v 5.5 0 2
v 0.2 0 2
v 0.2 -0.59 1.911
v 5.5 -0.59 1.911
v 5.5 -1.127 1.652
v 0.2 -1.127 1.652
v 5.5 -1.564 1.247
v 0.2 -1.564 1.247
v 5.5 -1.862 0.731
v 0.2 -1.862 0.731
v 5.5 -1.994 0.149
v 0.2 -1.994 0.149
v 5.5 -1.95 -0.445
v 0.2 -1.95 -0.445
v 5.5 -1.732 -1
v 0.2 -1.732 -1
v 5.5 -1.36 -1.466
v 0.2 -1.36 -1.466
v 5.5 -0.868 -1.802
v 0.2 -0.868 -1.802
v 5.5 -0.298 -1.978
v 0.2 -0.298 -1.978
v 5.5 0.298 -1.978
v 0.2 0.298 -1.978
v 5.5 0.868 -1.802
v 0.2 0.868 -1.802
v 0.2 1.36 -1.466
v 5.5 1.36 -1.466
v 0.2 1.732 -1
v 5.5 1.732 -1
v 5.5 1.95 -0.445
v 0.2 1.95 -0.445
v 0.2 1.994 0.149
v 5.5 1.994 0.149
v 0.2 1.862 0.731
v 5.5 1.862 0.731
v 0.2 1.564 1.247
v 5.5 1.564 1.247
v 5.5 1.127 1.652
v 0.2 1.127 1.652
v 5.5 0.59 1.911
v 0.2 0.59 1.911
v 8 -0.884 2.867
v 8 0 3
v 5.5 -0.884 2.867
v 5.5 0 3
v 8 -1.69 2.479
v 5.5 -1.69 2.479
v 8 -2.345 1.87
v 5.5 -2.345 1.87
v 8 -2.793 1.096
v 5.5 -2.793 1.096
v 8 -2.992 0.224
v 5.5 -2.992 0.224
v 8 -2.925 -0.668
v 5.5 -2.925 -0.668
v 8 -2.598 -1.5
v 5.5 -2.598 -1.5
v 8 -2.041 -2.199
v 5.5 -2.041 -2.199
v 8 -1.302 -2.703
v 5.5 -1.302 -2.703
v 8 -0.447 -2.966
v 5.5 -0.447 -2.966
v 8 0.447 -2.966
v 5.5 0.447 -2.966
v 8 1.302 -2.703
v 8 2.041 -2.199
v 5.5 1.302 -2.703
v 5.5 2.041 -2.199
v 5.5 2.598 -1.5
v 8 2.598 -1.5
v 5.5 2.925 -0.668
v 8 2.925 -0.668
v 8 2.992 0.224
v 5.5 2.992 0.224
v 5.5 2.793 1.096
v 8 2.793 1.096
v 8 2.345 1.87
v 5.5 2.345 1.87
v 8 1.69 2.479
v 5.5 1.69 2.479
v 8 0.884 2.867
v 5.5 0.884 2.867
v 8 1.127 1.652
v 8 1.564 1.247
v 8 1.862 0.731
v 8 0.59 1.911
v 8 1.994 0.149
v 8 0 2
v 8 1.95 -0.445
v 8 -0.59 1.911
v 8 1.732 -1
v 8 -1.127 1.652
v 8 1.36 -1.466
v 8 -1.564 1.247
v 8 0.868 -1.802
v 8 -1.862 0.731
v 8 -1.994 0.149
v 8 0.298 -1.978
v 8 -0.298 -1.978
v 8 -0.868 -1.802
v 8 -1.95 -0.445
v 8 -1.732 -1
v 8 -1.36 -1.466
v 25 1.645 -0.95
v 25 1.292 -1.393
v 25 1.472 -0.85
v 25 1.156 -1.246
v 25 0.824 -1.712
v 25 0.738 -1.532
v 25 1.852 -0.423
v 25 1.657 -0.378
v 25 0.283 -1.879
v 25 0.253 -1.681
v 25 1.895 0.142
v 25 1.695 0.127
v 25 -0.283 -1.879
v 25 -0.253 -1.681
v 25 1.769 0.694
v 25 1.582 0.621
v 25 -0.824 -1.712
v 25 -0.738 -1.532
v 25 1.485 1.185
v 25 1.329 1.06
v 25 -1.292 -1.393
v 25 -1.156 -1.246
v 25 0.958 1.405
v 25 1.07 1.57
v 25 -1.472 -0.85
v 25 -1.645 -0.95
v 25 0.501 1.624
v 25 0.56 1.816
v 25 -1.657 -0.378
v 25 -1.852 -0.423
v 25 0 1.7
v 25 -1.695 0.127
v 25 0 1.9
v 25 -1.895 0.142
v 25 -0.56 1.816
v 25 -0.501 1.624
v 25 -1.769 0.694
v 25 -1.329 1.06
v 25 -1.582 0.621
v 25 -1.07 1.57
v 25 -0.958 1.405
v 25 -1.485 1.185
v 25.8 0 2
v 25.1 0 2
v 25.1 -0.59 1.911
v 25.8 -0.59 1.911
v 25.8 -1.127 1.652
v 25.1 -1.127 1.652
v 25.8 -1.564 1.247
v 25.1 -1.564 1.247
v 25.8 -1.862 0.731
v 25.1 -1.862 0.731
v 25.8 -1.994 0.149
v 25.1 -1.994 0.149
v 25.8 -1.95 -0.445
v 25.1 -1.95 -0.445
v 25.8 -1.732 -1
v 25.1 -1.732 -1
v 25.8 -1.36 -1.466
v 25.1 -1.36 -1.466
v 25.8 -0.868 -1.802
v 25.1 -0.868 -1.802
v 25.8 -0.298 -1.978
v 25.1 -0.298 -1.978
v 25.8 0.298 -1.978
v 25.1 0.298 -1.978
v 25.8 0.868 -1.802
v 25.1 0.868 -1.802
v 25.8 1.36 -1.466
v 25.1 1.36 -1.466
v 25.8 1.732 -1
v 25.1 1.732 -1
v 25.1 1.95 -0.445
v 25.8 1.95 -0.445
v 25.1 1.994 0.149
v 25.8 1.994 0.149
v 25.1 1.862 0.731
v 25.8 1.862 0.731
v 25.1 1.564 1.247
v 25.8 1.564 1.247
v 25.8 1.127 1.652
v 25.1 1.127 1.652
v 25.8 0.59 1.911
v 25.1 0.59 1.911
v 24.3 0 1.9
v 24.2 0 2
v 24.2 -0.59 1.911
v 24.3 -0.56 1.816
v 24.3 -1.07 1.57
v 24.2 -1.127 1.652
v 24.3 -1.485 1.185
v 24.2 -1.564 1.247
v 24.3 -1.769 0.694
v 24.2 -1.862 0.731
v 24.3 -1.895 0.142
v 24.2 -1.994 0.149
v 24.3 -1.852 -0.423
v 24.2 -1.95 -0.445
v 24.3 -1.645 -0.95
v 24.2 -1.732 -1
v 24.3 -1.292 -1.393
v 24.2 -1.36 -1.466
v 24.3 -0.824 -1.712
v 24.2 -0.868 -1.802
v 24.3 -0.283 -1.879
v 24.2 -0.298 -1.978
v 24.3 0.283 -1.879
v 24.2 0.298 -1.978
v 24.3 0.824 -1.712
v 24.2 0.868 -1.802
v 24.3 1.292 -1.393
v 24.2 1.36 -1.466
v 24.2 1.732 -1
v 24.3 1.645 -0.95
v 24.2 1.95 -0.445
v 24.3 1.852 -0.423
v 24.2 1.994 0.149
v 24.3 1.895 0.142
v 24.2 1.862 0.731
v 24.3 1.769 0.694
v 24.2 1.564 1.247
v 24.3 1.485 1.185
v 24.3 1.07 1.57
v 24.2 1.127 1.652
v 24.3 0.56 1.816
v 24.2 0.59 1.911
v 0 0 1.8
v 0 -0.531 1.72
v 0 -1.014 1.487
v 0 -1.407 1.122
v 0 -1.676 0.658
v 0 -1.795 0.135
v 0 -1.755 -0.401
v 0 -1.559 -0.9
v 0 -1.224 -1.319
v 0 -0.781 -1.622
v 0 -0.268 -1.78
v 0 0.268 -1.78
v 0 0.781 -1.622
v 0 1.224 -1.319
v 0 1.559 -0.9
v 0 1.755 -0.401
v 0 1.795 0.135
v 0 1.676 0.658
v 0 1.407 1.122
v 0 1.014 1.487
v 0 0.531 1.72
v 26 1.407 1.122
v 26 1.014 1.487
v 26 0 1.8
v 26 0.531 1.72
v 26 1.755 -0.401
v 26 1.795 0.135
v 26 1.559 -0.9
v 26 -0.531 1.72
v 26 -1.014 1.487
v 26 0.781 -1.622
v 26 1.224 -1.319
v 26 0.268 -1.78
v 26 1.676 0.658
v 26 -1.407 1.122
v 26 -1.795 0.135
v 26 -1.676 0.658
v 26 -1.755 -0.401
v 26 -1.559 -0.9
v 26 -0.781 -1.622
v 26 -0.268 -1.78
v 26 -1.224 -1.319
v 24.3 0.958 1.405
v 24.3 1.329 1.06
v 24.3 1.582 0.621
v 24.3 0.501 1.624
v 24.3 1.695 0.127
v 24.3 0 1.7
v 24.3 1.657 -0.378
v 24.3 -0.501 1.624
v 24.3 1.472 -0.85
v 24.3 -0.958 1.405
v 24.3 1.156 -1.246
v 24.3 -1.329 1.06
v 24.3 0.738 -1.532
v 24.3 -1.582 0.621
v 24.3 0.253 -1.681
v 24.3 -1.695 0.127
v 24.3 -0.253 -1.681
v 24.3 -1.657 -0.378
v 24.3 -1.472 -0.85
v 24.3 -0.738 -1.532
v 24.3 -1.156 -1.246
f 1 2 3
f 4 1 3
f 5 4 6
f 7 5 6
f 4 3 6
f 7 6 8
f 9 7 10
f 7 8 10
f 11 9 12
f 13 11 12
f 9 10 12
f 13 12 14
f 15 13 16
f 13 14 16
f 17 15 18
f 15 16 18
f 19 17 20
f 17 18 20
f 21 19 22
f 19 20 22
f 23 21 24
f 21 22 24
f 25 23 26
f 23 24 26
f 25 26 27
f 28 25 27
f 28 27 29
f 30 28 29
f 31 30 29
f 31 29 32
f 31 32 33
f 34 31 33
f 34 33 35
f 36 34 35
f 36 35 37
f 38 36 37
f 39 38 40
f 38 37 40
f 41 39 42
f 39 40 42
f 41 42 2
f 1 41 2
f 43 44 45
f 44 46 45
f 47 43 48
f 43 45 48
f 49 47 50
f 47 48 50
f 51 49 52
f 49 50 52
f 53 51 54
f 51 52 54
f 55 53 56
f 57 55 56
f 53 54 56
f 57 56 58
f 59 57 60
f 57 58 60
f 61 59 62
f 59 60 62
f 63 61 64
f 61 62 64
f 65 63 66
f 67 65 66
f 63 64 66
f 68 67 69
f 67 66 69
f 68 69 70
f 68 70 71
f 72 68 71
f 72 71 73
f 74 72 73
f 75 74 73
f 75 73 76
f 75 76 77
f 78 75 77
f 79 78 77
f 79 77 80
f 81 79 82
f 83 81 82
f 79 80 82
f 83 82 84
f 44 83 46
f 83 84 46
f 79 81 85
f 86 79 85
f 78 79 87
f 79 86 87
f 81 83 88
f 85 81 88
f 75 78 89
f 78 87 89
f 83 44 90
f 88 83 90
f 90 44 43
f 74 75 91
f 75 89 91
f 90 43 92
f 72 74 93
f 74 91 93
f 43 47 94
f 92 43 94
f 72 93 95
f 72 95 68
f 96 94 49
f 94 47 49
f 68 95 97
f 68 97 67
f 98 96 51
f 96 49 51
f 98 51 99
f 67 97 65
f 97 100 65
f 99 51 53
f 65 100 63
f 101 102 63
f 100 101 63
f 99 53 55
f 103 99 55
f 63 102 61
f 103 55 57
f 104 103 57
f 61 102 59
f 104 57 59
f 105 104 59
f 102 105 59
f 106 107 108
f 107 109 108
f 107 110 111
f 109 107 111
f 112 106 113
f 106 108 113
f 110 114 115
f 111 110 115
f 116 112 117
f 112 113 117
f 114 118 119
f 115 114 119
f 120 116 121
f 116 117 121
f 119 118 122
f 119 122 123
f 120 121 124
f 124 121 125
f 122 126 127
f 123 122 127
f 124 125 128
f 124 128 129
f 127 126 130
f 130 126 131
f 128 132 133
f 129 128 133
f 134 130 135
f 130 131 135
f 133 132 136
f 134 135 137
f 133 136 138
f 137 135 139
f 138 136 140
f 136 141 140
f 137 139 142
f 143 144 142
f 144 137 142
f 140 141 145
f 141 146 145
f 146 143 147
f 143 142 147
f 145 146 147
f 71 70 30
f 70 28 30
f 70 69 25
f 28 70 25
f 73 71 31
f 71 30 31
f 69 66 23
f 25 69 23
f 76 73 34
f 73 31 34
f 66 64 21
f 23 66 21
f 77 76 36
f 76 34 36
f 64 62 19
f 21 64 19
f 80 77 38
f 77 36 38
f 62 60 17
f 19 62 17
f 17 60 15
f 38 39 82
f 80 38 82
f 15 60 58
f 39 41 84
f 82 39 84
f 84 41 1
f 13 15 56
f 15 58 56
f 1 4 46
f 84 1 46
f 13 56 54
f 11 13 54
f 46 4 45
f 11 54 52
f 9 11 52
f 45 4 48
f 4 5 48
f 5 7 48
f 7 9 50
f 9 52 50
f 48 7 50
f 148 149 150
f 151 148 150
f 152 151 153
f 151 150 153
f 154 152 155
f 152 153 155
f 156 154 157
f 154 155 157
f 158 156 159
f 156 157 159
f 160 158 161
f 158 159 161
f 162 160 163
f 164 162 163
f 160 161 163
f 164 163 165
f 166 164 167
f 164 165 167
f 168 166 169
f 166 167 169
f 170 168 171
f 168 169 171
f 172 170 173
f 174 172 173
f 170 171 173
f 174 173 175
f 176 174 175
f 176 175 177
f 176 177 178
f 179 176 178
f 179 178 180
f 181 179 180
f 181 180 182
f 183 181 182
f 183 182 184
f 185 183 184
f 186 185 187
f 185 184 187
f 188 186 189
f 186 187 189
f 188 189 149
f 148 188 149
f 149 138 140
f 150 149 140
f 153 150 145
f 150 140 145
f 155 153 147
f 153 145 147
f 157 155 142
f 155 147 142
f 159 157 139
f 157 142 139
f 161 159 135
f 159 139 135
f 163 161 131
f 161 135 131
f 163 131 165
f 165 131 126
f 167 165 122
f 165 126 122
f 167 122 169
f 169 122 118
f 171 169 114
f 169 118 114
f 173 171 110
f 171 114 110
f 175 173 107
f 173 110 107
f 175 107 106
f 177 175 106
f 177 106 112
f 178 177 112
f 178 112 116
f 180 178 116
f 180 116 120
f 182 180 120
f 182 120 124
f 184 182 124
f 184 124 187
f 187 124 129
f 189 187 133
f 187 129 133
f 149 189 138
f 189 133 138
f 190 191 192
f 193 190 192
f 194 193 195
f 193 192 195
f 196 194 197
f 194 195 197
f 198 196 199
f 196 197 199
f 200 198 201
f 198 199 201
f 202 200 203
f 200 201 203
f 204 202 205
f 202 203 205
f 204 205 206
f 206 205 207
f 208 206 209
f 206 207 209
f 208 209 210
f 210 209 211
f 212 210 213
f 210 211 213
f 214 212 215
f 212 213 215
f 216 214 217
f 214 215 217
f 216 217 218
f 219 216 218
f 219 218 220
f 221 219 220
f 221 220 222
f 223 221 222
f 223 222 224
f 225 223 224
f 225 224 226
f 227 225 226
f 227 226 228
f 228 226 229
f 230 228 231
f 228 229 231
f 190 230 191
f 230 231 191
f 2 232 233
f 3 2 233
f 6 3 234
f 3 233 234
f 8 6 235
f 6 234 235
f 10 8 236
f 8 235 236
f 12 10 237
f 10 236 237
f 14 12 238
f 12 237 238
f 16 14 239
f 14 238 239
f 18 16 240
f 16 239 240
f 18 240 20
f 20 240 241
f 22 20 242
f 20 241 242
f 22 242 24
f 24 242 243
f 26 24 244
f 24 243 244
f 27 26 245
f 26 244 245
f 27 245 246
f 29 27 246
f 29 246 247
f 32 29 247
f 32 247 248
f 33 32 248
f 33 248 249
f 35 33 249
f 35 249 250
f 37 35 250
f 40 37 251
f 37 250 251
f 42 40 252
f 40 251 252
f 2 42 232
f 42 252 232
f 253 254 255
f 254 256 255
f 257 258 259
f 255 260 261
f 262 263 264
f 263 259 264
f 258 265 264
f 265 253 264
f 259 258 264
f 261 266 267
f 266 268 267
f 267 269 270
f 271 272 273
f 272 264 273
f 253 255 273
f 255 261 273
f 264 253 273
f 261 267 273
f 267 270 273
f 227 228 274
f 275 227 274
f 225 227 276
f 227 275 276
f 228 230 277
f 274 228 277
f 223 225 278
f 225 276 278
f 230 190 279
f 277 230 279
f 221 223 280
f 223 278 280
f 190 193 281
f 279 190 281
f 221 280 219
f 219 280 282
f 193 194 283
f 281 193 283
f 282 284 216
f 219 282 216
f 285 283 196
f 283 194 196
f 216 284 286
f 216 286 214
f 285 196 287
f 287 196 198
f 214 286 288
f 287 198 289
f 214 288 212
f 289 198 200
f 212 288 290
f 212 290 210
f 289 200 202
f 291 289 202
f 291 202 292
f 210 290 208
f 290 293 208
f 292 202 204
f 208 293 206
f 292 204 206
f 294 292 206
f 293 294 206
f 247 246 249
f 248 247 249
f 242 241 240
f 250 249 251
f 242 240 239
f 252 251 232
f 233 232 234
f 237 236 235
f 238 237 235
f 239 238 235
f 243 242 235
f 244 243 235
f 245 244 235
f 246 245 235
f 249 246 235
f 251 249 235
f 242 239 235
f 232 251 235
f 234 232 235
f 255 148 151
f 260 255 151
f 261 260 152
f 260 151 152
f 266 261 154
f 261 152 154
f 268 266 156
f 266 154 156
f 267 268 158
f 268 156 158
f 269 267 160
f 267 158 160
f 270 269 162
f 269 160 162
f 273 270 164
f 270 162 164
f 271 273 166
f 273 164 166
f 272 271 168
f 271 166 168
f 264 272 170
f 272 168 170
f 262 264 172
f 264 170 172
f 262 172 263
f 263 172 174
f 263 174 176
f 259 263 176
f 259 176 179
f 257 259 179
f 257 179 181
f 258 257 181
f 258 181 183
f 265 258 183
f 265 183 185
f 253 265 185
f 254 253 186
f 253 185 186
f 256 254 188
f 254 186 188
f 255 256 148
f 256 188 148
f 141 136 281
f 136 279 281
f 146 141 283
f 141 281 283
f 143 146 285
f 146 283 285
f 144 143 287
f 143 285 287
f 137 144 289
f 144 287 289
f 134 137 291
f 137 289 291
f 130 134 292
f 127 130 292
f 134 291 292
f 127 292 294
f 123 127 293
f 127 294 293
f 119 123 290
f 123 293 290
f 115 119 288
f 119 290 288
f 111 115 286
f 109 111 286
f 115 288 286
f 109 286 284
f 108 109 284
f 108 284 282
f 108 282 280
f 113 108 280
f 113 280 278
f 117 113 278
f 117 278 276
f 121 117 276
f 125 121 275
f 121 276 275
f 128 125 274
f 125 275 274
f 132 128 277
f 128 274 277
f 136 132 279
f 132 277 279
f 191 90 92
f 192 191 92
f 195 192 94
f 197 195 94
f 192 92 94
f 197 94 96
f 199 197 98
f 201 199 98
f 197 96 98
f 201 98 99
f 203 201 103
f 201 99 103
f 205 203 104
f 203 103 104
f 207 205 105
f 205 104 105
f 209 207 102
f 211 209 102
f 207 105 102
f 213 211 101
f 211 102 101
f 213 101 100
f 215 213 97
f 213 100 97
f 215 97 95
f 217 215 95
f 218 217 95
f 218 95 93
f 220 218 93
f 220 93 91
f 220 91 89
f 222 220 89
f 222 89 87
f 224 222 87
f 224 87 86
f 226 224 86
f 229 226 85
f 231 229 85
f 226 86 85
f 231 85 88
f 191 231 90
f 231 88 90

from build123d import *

# Parameters (mm, degrees)
CHAMFER_1_SIZE = 0.2
CHAMFER_2_SIZE = 0.1


with BuildPart() as part:
    # Эскиз1 → Повернуть1 (revolve)
    with BuildSketch(Plane.XY, mode=Mode.PRIVATE) as revolve_1_sk:
        Polygon((0, 0), (26, 0), (26, 2), (25, 2), (25, 1.7), (24.3, 1.7), (24.3, 2), (8, 2), (8, 3), (5.5, 3), (5.5, 2), (0, 2), align=None)
    revolve(revolve_1_sk.sketch.rotate(Axis((0, 0, 0), (1, 0, 0)), 90), axis=Axis((0, 0, 0), (1, 0, 0)))

    # Фаска1
    chamfer_1_edges = [part.edges().sort_by_distance(p)[0] for p in [
        (26, 0, -2),
        (0, 0, -2),
    ]]
    chamfer(chamfer_1_edges, length=CHAMFER_1_SIZE)

    # Фаска2
    chamfer_2_edges = [part.edges().sort_by_distance(p)[0] for p in [
        (24.3, 0, -2),
        (25, 0, -2),
    ]]
    chamfer(chamfer_2_edges, length=CHAMFER_2_SIZE)


solid = part.part
